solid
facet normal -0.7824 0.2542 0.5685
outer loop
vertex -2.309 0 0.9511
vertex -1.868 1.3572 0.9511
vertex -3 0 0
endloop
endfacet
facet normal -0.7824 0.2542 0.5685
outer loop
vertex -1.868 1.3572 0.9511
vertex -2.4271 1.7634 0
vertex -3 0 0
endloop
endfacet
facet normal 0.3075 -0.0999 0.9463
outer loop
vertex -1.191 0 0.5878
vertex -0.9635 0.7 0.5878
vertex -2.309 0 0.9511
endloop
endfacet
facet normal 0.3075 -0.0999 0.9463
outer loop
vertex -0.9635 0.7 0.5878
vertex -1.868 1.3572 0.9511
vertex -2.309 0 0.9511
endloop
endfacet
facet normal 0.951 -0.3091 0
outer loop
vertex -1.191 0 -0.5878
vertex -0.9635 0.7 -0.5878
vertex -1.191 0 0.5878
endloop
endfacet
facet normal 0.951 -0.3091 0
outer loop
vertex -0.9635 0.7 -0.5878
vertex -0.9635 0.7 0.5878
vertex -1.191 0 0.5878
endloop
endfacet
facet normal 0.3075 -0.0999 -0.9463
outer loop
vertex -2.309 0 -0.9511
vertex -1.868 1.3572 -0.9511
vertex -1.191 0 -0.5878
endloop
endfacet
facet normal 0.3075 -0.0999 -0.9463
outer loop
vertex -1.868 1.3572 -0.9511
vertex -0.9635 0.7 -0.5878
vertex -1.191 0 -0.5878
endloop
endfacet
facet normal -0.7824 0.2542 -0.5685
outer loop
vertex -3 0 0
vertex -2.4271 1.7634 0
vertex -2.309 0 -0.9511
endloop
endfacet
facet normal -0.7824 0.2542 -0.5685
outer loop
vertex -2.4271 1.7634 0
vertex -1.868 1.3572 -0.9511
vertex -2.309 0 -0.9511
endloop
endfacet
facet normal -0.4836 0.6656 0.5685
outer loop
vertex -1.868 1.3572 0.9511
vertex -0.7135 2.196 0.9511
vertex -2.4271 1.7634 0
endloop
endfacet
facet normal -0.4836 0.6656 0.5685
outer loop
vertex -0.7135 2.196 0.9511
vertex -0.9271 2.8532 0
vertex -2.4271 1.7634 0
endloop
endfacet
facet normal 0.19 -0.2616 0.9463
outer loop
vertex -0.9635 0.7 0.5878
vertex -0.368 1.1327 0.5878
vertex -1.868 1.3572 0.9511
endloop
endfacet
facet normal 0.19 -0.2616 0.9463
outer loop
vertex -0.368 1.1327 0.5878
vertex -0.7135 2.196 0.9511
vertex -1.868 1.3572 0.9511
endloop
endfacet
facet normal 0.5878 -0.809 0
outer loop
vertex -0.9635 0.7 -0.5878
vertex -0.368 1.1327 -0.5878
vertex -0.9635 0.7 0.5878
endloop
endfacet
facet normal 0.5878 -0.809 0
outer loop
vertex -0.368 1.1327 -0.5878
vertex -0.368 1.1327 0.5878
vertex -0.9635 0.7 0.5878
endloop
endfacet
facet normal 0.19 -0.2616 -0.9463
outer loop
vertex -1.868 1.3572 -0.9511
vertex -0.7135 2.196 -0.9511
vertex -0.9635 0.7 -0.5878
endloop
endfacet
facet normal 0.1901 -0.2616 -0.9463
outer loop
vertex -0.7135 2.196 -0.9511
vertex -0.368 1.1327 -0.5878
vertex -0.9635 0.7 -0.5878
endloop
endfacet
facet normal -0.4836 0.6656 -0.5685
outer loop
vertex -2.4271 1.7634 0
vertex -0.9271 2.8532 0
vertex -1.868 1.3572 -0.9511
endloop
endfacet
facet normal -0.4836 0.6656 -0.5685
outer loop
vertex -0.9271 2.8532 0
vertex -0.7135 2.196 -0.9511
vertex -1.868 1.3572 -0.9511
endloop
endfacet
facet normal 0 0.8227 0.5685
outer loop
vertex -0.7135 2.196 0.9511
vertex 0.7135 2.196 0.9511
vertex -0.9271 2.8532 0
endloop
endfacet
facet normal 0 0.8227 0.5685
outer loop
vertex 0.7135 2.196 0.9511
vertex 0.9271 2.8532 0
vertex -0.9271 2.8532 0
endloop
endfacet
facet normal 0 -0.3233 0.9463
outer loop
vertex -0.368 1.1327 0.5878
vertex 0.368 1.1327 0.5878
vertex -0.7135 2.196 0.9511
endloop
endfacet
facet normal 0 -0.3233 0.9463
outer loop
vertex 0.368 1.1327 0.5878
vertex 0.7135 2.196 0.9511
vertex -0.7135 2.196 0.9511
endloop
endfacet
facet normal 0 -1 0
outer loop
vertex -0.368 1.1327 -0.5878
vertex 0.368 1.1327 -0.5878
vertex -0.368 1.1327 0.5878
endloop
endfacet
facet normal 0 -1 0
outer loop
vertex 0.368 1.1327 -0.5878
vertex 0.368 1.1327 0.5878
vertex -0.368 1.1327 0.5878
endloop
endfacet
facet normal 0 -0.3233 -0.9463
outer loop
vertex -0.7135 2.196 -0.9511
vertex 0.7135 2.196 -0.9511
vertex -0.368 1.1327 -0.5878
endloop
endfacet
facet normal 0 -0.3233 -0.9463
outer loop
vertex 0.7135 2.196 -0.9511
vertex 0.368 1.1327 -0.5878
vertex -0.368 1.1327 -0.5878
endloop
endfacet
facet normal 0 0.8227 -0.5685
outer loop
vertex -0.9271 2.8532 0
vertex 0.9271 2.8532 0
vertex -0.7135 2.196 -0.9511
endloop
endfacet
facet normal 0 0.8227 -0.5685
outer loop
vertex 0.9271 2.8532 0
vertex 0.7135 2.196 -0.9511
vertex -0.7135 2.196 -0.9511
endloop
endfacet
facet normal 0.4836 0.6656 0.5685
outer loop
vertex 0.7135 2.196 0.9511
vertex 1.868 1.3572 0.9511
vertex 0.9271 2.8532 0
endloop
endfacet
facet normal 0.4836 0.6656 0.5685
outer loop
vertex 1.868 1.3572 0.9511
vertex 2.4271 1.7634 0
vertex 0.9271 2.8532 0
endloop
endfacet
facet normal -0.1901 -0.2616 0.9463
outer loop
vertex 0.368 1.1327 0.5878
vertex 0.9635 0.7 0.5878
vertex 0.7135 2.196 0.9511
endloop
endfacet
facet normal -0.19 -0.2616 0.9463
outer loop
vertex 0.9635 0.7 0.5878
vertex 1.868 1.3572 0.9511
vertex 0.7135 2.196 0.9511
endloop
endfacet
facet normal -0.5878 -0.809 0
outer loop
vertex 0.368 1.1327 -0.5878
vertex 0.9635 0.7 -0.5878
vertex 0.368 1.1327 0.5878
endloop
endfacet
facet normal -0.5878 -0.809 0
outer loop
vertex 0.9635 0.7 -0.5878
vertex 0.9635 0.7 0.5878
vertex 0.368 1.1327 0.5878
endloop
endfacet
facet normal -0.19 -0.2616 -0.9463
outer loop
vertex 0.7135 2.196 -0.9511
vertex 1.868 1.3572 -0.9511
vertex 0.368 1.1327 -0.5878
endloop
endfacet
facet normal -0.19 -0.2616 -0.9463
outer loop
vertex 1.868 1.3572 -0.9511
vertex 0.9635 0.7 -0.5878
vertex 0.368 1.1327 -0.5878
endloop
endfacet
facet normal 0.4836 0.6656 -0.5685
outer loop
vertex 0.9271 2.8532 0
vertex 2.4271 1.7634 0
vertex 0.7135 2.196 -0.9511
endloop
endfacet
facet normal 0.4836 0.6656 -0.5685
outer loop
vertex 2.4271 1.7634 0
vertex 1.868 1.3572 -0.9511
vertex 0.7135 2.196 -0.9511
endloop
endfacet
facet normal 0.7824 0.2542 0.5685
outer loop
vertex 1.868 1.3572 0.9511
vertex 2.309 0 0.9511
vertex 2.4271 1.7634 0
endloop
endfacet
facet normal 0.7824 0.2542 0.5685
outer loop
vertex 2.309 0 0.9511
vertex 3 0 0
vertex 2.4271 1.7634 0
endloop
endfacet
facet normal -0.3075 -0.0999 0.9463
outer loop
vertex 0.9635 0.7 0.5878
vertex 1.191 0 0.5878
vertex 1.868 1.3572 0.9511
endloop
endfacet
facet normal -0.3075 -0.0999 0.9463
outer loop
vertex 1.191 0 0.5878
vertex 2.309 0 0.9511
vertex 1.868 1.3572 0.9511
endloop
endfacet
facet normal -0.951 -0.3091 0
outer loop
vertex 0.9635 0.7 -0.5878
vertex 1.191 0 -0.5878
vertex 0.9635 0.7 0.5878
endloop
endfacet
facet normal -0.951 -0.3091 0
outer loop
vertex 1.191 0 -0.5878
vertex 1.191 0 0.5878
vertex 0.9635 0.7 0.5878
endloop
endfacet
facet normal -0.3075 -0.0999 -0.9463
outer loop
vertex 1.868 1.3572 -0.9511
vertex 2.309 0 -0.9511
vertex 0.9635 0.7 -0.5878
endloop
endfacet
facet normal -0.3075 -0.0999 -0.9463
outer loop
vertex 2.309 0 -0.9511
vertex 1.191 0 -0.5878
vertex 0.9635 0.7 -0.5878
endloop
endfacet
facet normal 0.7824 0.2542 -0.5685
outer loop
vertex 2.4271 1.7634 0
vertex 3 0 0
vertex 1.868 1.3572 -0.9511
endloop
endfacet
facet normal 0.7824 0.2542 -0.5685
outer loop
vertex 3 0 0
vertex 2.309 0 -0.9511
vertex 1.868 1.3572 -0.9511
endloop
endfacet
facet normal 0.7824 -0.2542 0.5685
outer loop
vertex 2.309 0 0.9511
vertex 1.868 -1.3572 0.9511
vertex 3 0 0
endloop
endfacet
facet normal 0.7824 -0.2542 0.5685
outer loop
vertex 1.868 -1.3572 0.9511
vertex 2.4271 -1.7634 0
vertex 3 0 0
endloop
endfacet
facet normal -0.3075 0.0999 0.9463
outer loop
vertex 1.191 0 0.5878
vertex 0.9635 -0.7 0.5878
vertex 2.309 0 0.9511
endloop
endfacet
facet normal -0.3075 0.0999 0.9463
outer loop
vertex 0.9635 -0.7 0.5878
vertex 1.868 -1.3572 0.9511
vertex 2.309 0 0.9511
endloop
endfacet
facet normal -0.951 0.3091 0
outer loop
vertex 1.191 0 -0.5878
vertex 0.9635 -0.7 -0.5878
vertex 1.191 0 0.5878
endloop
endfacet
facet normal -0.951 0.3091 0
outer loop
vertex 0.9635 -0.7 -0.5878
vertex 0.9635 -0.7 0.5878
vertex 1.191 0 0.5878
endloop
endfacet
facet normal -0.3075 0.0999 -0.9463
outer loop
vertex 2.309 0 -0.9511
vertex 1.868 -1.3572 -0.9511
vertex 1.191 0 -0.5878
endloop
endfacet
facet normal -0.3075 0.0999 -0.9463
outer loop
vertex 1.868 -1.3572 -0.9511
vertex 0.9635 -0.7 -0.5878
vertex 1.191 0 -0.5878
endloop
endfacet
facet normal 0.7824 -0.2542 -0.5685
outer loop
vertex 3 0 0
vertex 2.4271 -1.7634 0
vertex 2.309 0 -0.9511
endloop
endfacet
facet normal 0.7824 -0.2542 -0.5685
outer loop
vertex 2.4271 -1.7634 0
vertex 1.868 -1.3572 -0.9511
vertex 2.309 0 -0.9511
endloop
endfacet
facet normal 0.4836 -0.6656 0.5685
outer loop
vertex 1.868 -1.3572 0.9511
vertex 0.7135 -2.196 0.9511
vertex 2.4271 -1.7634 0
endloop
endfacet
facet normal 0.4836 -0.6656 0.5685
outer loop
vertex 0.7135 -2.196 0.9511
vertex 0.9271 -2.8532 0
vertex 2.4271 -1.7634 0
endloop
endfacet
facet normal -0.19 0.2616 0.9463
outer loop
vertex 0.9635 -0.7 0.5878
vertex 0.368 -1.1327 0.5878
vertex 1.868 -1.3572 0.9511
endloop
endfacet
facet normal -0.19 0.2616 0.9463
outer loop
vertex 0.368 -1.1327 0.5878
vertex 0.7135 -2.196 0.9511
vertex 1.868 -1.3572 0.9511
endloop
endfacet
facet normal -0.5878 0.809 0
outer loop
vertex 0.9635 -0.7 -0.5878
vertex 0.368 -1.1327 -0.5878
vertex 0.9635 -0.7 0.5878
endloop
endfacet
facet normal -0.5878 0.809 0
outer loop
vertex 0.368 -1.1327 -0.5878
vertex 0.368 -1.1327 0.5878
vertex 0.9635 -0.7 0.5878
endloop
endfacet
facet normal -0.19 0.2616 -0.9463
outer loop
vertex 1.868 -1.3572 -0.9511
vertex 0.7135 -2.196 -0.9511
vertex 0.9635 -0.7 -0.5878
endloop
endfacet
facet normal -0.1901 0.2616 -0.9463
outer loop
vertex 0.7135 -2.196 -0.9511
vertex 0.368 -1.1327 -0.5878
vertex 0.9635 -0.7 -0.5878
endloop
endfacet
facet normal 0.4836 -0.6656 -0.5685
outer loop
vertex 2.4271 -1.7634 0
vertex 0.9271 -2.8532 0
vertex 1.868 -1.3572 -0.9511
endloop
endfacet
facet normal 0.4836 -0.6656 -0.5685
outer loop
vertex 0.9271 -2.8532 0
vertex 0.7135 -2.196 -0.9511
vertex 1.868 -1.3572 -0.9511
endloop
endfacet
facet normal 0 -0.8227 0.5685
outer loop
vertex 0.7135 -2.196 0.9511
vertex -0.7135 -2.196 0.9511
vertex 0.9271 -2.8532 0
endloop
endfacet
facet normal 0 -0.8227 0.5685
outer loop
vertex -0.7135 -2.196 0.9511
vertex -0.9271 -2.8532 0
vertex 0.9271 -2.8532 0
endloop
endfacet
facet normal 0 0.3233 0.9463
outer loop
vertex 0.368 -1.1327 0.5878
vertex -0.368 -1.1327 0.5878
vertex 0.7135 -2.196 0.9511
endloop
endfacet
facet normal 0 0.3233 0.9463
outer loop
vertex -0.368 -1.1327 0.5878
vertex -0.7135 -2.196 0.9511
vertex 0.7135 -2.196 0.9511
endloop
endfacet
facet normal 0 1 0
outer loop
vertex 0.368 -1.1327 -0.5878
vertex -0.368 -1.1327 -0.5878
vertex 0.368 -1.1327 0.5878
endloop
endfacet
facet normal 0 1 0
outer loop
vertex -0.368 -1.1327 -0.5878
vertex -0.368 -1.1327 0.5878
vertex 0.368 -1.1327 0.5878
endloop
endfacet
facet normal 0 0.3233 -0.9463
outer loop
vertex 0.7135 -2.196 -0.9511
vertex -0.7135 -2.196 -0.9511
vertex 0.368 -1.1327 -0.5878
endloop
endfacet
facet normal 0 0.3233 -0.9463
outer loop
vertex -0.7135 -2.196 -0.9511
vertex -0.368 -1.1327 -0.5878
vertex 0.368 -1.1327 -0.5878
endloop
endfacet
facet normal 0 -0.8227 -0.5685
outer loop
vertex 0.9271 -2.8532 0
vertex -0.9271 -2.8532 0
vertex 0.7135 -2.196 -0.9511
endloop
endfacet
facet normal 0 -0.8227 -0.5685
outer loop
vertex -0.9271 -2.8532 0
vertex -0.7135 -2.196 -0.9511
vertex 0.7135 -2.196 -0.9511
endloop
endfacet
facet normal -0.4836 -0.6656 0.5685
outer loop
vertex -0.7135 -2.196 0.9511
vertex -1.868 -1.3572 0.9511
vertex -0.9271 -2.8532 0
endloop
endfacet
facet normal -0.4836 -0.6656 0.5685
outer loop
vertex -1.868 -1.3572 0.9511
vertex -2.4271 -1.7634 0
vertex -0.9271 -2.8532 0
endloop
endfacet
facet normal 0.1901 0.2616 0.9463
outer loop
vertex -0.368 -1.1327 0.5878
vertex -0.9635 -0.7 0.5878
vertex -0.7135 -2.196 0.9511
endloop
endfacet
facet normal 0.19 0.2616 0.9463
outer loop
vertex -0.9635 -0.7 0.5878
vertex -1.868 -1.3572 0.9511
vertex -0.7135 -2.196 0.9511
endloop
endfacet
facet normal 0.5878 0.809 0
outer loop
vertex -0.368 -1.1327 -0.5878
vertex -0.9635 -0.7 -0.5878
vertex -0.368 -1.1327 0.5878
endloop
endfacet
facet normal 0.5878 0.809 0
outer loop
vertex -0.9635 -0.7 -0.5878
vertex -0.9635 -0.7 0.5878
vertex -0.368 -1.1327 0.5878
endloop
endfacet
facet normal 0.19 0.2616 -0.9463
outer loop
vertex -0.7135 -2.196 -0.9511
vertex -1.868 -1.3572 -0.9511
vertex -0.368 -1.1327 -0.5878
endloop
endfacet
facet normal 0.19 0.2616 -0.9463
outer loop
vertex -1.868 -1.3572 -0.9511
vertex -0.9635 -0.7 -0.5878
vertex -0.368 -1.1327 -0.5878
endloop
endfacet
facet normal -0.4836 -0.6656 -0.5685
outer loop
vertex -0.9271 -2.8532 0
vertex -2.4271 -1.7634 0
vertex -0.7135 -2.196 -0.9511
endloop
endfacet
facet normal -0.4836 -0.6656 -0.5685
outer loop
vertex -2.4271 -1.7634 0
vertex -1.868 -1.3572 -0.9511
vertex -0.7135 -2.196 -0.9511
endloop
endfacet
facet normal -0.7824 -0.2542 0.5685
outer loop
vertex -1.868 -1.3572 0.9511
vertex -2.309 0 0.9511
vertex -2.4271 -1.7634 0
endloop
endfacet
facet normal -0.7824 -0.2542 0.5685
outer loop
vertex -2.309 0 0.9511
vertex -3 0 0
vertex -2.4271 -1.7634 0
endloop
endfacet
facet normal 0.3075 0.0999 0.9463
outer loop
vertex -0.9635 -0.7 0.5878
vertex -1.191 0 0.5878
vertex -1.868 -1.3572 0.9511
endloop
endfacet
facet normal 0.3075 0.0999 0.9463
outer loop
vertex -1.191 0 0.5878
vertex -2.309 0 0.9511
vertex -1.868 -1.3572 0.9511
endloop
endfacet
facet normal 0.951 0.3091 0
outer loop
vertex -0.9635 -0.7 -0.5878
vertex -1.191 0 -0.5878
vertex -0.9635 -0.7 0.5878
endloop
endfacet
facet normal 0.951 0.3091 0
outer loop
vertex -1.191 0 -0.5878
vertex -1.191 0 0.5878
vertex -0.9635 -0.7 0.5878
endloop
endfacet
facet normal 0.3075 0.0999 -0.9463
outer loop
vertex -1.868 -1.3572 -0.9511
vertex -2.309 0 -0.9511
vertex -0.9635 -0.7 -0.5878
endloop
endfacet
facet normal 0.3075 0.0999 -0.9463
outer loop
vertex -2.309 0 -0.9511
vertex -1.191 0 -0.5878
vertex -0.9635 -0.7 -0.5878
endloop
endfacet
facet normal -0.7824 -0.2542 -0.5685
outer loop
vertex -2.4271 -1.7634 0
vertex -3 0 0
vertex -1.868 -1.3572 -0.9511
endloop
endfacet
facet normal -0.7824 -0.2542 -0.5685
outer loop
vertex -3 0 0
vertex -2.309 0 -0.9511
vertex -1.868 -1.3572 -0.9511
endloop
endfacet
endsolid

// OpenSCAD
// Unit of length: Unit.MM
rotate_extrude(angle = 360.0, convexity = 10)
{
   translate(v = [2.0, 0.0])
   {
      circle(r = 1.0);
   }
}
